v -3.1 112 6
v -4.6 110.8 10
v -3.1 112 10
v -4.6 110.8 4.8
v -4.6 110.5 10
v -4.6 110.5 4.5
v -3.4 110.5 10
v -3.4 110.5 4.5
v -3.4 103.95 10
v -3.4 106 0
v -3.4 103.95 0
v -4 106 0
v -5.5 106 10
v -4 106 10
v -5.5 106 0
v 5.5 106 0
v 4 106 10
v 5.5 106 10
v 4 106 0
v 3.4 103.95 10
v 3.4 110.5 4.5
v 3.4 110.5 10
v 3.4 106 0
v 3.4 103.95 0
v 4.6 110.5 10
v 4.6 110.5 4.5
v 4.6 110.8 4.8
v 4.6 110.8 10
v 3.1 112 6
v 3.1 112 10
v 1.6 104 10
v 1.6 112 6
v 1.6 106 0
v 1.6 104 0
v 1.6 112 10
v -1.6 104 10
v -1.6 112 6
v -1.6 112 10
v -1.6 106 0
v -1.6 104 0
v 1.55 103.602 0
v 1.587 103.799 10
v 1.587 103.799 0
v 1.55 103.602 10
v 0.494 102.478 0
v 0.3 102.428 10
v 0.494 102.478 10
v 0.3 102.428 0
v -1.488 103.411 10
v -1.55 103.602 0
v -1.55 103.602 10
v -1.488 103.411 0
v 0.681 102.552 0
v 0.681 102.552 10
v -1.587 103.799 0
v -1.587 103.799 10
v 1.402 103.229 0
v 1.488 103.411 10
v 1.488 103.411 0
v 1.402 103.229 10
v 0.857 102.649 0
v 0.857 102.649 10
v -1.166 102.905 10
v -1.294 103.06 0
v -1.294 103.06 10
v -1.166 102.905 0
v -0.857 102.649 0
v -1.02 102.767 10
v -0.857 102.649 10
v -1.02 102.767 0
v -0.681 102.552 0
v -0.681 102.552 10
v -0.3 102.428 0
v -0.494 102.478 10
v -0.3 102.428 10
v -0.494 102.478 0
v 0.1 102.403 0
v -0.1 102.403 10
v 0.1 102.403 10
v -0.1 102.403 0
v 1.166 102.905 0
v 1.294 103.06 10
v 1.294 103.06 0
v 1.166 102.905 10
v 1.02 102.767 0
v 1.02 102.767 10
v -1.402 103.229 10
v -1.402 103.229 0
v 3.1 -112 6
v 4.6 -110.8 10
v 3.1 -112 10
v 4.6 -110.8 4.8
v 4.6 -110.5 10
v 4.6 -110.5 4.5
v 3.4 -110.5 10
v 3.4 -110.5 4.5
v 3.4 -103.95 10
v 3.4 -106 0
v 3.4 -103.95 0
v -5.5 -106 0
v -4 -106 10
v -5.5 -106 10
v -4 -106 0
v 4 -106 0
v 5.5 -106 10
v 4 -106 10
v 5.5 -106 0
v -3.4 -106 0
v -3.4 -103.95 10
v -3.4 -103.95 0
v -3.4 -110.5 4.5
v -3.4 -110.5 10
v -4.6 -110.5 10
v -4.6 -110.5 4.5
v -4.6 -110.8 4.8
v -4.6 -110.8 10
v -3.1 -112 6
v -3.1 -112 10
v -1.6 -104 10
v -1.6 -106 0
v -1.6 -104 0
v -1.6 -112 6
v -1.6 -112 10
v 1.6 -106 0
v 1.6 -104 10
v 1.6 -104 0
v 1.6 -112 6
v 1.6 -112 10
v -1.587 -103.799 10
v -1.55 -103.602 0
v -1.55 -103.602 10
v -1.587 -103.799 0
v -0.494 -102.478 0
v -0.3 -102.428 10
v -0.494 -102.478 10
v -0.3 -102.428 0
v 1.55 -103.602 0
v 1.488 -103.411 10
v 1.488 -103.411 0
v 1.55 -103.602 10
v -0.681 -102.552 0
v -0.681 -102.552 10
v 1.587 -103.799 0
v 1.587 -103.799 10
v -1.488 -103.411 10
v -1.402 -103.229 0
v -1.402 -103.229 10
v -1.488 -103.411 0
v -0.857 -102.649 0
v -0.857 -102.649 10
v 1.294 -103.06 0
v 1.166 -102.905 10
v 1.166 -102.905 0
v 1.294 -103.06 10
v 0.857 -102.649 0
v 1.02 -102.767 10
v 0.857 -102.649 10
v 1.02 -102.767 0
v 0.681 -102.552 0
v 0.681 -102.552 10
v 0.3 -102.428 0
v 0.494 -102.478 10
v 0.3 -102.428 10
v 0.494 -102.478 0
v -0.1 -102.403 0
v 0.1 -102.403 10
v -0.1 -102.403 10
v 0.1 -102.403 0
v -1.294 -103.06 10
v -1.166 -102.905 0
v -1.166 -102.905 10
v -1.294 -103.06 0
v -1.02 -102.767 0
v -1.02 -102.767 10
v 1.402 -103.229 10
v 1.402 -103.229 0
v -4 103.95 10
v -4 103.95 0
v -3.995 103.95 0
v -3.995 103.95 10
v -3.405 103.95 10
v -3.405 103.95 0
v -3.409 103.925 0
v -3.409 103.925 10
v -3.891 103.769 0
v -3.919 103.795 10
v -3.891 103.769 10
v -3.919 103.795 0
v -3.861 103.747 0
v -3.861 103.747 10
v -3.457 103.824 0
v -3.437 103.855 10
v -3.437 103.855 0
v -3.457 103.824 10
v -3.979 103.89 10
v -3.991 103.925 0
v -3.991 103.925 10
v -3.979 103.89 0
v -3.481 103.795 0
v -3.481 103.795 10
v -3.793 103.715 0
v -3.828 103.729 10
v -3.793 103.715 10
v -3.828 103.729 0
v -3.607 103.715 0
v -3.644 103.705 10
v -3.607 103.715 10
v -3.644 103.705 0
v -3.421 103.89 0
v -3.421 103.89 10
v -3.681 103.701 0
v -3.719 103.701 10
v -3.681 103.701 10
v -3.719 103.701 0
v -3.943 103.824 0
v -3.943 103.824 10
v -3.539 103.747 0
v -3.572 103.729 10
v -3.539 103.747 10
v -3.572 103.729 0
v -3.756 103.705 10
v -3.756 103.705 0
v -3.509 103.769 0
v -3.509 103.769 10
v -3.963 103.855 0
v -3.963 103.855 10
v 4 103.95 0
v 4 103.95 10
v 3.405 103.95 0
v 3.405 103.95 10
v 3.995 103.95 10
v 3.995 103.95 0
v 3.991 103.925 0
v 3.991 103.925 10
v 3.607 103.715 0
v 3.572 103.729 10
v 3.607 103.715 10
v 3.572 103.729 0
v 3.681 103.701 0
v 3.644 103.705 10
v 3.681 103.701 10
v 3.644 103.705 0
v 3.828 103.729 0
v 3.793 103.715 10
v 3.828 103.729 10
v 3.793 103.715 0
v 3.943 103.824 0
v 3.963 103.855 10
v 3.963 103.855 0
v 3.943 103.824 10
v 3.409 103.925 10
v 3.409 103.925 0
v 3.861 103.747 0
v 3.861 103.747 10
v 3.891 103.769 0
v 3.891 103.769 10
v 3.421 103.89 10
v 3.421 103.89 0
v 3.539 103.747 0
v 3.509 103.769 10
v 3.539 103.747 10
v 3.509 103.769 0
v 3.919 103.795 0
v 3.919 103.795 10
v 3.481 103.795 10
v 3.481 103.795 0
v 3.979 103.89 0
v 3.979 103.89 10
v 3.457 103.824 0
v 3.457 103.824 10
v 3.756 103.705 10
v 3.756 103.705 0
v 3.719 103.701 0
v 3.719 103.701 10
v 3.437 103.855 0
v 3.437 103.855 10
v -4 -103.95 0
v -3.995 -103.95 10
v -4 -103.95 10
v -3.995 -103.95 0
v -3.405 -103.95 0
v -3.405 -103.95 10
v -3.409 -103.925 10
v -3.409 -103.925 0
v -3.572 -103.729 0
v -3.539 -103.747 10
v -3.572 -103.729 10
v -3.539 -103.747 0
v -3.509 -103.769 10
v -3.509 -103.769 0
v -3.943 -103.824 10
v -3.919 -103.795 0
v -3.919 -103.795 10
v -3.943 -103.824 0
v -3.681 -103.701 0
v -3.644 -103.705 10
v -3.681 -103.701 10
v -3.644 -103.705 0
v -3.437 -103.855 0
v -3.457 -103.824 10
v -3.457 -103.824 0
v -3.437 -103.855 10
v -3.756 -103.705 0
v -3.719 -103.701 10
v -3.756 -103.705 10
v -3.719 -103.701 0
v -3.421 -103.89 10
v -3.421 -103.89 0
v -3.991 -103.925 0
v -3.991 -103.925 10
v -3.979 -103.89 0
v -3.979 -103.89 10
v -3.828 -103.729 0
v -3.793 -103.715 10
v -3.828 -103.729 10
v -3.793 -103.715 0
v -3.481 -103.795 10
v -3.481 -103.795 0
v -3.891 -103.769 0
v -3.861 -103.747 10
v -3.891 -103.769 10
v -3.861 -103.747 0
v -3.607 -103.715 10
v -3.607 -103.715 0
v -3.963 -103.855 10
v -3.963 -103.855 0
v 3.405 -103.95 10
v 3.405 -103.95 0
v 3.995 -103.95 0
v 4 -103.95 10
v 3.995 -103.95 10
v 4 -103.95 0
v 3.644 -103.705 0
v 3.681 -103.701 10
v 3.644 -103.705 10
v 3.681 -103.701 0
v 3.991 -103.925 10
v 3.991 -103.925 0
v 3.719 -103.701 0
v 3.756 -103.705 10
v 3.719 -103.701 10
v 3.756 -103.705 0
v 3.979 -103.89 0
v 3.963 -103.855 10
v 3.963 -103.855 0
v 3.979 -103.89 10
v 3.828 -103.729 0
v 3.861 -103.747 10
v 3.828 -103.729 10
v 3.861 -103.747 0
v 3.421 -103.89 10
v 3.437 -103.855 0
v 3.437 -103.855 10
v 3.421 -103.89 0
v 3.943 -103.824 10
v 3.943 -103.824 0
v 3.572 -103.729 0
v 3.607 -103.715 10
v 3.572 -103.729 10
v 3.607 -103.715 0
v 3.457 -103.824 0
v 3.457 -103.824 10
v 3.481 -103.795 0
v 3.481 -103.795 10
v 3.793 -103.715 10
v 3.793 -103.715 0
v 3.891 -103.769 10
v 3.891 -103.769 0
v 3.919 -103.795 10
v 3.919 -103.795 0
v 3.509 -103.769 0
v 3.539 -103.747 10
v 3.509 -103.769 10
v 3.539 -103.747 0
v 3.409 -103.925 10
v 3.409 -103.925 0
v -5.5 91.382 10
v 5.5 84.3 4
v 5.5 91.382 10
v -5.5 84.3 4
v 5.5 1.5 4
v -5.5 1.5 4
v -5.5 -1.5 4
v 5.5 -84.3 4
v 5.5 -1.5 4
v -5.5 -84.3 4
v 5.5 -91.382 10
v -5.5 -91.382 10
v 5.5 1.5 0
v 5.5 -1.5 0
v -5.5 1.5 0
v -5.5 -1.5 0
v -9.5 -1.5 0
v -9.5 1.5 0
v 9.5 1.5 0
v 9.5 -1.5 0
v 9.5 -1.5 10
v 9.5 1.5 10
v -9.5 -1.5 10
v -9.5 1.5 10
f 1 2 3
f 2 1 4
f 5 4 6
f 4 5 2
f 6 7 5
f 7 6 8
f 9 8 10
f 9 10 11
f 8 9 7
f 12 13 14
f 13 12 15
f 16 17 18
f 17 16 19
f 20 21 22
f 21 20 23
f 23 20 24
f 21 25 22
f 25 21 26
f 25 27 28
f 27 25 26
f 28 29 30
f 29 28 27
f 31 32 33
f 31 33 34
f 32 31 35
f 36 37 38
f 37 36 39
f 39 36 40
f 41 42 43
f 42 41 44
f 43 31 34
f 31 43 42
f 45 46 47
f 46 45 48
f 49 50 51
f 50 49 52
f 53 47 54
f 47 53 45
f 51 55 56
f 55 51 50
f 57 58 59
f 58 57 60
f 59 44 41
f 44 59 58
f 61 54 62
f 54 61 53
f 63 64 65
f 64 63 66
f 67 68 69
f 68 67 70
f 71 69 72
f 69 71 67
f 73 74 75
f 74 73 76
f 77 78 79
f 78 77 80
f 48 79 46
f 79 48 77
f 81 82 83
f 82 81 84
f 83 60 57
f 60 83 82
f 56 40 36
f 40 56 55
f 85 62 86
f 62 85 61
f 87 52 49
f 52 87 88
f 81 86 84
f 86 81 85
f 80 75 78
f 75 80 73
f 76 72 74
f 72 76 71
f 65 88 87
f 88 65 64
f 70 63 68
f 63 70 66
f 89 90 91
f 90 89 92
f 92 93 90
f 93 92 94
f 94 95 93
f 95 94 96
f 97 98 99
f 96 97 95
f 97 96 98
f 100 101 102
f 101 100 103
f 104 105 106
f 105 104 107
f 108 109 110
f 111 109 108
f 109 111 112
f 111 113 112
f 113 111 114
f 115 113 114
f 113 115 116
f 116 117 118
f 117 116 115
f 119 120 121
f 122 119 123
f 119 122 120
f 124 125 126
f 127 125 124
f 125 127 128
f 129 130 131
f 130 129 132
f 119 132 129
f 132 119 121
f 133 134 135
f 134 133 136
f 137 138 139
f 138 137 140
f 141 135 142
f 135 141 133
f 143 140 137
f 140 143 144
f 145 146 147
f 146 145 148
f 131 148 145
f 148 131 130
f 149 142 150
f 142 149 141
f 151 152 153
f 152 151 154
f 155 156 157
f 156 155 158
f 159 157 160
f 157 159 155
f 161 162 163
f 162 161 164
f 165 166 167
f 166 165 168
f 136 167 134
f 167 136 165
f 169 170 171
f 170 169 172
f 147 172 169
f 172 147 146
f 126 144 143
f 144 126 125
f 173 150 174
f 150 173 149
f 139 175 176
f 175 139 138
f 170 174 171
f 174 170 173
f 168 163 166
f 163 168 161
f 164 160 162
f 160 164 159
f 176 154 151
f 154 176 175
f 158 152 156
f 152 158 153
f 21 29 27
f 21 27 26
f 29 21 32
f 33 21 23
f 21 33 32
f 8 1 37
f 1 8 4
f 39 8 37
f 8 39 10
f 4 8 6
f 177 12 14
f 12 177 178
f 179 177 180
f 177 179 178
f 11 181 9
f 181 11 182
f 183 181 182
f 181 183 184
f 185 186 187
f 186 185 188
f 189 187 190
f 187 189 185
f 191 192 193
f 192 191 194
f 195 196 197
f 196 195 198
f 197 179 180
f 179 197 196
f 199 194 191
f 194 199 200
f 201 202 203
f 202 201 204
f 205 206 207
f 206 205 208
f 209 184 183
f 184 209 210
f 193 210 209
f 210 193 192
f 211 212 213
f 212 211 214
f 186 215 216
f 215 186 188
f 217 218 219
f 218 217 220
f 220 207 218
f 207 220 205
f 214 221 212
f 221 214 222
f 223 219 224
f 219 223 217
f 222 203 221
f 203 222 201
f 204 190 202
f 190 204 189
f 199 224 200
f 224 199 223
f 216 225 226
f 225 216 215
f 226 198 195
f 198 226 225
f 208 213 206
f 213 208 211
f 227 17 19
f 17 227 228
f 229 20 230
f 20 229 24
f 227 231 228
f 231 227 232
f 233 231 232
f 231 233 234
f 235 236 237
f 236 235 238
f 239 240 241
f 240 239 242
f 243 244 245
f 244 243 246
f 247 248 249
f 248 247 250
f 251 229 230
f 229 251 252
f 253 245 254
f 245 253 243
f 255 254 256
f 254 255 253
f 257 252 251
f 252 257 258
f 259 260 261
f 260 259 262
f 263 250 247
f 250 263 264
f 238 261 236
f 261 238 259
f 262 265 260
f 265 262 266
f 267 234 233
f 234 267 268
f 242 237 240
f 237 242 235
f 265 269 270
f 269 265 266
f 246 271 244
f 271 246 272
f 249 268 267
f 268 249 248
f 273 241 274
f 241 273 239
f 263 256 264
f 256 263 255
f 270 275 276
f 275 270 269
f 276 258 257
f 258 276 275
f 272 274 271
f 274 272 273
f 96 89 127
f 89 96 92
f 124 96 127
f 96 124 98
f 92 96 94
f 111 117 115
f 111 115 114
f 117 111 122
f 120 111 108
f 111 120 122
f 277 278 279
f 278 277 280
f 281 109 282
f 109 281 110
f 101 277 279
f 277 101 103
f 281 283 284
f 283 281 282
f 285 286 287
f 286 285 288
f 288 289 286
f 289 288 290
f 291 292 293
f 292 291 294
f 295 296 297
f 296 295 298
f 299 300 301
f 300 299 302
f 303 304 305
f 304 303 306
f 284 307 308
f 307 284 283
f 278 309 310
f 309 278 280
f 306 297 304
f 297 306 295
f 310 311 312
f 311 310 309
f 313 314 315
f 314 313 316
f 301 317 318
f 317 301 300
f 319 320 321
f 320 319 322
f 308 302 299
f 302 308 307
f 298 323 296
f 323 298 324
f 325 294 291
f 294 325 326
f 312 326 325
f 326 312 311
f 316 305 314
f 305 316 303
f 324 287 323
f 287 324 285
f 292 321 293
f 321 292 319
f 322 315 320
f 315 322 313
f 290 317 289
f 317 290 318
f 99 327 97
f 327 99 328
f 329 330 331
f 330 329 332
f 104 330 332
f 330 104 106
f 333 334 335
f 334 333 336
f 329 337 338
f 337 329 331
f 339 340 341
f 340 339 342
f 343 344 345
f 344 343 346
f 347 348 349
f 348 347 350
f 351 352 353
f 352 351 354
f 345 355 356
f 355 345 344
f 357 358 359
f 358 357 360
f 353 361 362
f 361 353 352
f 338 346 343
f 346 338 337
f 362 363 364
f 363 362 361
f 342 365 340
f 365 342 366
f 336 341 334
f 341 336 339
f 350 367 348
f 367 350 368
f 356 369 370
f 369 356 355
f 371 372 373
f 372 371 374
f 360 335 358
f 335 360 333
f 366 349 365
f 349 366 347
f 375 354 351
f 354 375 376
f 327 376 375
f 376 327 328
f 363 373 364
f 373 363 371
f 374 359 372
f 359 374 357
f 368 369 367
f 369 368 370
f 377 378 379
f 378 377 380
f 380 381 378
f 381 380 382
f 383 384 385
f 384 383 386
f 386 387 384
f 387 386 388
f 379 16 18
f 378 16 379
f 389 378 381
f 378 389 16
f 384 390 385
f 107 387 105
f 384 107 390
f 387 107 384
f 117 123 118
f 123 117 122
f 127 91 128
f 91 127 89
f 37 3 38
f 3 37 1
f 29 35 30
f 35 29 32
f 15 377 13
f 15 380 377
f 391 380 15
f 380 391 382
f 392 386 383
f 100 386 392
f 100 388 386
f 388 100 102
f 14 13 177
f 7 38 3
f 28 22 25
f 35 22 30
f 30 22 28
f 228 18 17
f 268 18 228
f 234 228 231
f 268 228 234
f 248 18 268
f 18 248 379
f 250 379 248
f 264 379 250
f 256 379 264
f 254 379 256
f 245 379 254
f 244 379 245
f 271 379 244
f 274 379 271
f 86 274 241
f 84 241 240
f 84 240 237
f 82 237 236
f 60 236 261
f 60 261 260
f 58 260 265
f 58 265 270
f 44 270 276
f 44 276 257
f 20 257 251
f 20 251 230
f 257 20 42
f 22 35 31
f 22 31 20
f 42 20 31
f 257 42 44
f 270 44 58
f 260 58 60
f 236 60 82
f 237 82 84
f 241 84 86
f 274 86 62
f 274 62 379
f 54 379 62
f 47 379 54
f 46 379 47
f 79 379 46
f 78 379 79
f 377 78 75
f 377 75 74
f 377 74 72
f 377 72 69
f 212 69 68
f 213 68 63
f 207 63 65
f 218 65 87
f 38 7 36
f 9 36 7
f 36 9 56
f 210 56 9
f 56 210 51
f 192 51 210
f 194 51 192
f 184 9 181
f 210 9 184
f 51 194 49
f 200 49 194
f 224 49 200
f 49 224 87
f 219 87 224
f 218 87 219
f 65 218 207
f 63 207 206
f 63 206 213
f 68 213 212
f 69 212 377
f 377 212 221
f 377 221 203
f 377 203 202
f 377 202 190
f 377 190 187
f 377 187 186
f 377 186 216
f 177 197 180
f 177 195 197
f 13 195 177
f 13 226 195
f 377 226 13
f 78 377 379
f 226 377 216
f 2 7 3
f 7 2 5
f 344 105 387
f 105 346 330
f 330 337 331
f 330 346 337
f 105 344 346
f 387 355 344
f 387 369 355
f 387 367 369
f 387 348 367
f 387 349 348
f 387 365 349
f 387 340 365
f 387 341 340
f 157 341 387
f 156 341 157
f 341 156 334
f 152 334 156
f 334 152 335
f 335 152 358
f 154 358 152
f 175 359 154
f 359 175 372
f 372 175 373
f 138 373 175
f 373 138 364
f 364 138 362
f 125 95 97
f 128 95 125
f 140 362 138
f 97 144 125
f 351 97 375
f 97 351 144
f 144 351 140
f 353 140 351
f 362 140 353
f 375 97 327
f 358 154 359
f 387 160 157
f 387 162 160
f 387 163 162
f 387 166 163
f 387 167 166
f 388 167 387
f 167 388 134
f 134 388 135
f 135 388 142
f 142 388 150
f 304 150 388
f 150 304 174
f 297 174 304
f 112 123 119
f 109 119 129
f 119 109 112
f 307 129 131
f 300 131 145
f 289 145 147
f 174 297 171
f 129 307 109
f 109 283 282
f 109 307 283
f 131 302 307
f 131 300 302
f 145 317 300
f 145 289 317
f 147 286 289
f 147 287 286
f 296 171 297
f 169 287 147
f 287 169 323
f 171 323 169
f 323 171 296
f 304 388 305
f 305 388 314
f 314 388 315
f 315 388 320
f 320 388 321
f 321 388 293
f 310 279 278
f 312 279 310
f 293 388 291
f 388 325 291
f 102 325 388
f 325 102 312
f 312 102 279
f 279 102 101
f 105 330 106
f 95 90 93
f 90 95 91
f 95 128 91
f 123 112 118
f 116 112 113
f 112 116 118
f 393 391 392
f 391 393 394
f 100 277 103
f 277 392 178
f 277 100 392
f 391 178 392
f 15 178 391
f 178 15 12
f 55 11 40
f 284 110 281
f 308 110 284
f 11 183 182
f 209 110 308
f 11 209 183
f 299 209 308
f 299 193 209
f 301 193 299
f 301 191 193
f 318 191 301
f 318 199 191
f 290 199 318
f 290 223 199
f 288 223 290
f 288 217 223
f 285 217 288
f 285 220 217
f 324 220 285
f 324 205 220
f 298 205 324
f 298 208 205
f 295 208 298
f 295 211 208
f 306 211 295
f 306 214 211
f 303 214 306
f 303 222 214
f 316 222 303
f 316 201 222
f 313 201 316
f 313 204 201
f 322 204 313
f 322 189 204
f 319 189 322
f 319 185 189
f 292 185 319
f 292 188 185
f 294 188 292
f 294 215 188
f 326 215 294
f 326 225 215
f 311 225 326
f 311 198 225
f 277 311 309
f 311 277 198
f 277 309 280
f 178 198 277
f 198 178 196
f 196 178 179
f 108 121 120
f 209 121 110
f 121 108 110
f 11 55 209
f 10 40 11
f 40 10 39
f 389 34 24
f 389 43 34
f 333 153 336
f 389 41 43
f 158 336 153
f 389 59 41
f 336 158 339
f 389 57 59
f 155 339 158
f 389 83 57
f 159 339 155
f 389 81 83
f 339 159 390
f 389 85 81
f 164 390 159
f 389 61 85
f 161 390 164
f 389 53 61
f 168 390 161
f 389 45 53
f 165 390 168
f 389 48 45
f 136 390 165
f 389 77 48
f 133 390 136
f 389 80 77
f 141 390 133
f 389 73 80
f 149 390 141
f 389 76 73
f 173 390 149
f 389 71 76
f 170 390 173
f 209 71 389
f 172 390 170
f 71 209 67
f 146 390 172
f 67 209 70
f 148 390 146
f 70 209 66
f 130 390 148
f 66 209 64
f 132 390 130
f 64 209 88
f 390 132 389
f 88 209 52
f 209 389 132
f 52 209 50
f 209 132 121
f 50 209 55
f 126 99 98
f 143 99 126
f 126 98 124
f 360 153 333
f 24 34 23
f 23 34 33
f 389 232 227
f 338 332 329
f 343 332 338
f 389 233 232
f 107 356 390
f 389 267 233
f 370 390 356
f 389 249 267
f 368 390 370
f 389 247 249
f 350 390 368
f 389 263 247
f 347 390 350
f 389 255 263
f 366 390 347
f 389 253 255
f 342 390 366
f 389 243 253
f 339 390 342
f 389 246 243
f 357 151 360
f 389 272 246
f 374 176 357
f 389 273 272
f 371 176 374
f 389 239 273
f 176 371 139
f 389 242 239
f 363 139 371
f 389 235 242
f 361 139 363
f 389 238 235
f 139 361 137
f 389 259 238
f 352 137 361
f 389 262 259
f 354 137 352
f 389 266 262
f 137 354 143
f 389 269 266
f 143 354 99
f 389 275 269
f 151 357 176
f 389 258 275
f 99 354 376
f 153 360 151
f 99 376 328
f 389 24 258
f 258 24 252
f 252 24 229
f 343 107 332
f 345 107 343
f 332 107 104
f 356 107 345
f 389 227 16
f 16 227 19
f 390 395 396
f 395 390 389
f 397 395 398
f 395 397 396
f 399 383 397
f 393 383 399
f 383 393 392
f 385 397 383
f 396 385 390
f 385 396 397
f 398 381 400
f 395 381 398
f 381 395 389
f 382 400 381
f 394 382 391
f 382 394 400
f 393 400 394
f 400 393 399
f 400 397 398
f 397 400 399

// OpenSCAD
$fn = 50;

difference() {
	union() {
		translate(v = [0, 106.0, 0]) {
			rotate(a = [90, 0, 0]) {
				difference() {
					union() {
						translate(v = [0, 0, 0]) {
							rotate(a = [0, 0, 0]) {
								difference() {
									union() {
										translate(v = [-5.5, 0, -6.0]) {
											cube(size = [11.0, 10.0, 224.0]);
										}
									}
									union() {
										translate(v = [0, 0, 0]) {
											rotate(a = [0, 0, 0]) {
												difference() {
													union() {
														translate(v = [0, 10.1, 0]) {
															rotate(a = [90, 0, 0]) {
																linear_extrude(height = 10.2) {
																	polygon(points = [[-3.1, -6.1], [-3.1, -6.0], [-4.6, -4.8], [-4.6, -4.5], [-3.4, -4.5], [-3.4, 0], [-5.6, 0], [-5.6, -6.1]]);
																}
															}
														}
														translate(v = [0, 10.1, 0]) {
															rotate(a = [90, 0, 0]) {
																linear_extrude(height = 10.2) {
																	polygon(points = [[3.1, -6.1], [3.1, -6.0], [4.6, -4.8], [4.6, -4.5], [3.4, -4.5], [3.4, 0], [5.6, 0], [5.6, -6.1]]);
																}
															}
														}
														translate(v = [-1.5999999999999999, -0.1, -6.1]) {
															cube(size = [3.1999999999999997, 10.2, 8.1]);
														}
														translate(v = [0, 10.1, 2.0]) {
															rotate(a = [90, 0, 0]) {
																cylinder(h = 10.2, r = 1.5999999999999999);
															}
														}
													}
													union();
												}
											}
										}
										translate(v = [0, 0, 212.0]) {
											rotate(a = [0, 180, 0]) {
												difference() {
													union() {
														translate(v = [0, 10.1, 0]) {
															rotate(a = [90, 0, 0]) {
																linear_extrude(height = 10.2) {
																	polygon(points = [[-3.1, -6.1], [-3.1, -6.0], [-4.6, -4.8], [-4.6, -4.5], [-3.4, -4.5], [-3.4, 0], [-5.6, 0], [-5.6, -6.1]]);
																}
															}
														}
														translate(v = [0, 10.1, 0]) {
															rotate(a = [90, 0, 0]) {
																linear_extrude(height = 10.2) {
																	polygon(points = [[3.1, -6.1], [3.1, -6.0], [4.6, -4.8], [4.6, -4.5], [3.4, -4.5], [3.4, 0], [5.6, 0], [5.6, -6.1]]);
																}
															}
														}
														translate(v = [-1.5999999999999999, -0.1, -6.1]) {
															cube(size = [3.1999999999999997, 10.2, 8.1]);
														}
														translate(v = [0, 10.1, 2.0]) {
															rotate(a = [90, 0, 0]) {
																cylinder(h = 10.2, r = 1.5999999999999999);
															}
														}
													}
													union();
												}
											}
										}
										translate(v = [-5.6, 0, 0]) {
											rotate(a = [90, 0, 90]) {
												linear_extrude(height = 11.2) {
													polygon(points = [[-0.1, -6.1], [6.1, -6.1], [0, 0.0], [-0.1, 0.0]]);
												}
											}
										}
										translate(v = [0, 10.1, 0]) {
											rotate(a = [90, 0, 0]) {
												linear_extrude(height = 10.2) {
													polygon(points = [[-3.4, -0.1], [-4.0, -0.1], [-4.0, 2.05], [-3.4, 2.05]]);
												}
											}
										}
										translate(v = [-3.6999999999999997, 10.1, 2.0]) {
											rotate(a = [90, 0, 0]) {
												cylinder(h = 10.2, r = 0.3);
											}
										}
										translate(v = [0, 10.1, 0]) {
											rotate(a = [90, 0, 0]) {
												linear_extrude(height = 10.2) {
													polygon(points = [[3.4, -0.1], [4.0, -0.1], [4.0, 2.05], [3.4, 2.05]]);
												}
											}
										}
										translate(v = [3.6999999999999997, 10.1, 2.0]) {
											rotate(a = [90, 0, 0]) {
												cylinder(h = 10.2, r = 0.3);
											}
										}
										translate(v = [-5.6, 0, 0]) {
											rotate(a = [90, 0, 90]) {
												linear_extrude(height = 11.2) {
													polygon(points = [[-0.1, 218.1], [6.1, 218.1], [0, 212.0], [-0.1, 212.0]]);
												}
											}
										}
										translate(v = [0, 10.1, 0]) {
											rotate(a = [90, 0, 0]) {
												linear_extrude(height = 10.2) {
													polygon(points = [[-3.4, 212.1], [-4.0, 212.1], [-4.0, 209.95], [-3.4, 209.95]]);
												}
											}
										}
										translate(v = [-3.6999999999999997, 10.1, 210.0]) {
											rotate(a = [90, 0, 0]) {
												cylinder(h = 10.2, r = 0.3);
											}
										}
										translate(v = [0, 10.1, 0]) {
											rotate(a = [90, 0, 0]) {
												linear_extrude(height = 10.2) {
													polygon(points = [[3.4, 212.1], [4.0, 212.1], [4.0, 209.95], [3.4, 209.95]]);
												}
											}
										}
										translate(v = [3.6999999999999997, 10.1, 210.0]) {
											rotate(a = [90, 0, 0]) {
												cylinder(h = 10.2, r = 0.3);
											}
										}
										translate(v = [-5.6, 0, 0]) {
											rotate(a = [90, 0, 90]) {
												linear_extrude(height = 11.2) {
													polygon(points = [[10.1, 14.5], [10.1, 197.5], [4.0, 190.3], [4.0, 21.7]]);
												}
											}
										}
									}
								}
							}
						}
						translate(v = [-9.5, 0, 104.5]) {
							cube(size = [19.0, 10.0, 3.0]);
						}
					}
					union();
				}
			}
		}
	}
	union();
}
